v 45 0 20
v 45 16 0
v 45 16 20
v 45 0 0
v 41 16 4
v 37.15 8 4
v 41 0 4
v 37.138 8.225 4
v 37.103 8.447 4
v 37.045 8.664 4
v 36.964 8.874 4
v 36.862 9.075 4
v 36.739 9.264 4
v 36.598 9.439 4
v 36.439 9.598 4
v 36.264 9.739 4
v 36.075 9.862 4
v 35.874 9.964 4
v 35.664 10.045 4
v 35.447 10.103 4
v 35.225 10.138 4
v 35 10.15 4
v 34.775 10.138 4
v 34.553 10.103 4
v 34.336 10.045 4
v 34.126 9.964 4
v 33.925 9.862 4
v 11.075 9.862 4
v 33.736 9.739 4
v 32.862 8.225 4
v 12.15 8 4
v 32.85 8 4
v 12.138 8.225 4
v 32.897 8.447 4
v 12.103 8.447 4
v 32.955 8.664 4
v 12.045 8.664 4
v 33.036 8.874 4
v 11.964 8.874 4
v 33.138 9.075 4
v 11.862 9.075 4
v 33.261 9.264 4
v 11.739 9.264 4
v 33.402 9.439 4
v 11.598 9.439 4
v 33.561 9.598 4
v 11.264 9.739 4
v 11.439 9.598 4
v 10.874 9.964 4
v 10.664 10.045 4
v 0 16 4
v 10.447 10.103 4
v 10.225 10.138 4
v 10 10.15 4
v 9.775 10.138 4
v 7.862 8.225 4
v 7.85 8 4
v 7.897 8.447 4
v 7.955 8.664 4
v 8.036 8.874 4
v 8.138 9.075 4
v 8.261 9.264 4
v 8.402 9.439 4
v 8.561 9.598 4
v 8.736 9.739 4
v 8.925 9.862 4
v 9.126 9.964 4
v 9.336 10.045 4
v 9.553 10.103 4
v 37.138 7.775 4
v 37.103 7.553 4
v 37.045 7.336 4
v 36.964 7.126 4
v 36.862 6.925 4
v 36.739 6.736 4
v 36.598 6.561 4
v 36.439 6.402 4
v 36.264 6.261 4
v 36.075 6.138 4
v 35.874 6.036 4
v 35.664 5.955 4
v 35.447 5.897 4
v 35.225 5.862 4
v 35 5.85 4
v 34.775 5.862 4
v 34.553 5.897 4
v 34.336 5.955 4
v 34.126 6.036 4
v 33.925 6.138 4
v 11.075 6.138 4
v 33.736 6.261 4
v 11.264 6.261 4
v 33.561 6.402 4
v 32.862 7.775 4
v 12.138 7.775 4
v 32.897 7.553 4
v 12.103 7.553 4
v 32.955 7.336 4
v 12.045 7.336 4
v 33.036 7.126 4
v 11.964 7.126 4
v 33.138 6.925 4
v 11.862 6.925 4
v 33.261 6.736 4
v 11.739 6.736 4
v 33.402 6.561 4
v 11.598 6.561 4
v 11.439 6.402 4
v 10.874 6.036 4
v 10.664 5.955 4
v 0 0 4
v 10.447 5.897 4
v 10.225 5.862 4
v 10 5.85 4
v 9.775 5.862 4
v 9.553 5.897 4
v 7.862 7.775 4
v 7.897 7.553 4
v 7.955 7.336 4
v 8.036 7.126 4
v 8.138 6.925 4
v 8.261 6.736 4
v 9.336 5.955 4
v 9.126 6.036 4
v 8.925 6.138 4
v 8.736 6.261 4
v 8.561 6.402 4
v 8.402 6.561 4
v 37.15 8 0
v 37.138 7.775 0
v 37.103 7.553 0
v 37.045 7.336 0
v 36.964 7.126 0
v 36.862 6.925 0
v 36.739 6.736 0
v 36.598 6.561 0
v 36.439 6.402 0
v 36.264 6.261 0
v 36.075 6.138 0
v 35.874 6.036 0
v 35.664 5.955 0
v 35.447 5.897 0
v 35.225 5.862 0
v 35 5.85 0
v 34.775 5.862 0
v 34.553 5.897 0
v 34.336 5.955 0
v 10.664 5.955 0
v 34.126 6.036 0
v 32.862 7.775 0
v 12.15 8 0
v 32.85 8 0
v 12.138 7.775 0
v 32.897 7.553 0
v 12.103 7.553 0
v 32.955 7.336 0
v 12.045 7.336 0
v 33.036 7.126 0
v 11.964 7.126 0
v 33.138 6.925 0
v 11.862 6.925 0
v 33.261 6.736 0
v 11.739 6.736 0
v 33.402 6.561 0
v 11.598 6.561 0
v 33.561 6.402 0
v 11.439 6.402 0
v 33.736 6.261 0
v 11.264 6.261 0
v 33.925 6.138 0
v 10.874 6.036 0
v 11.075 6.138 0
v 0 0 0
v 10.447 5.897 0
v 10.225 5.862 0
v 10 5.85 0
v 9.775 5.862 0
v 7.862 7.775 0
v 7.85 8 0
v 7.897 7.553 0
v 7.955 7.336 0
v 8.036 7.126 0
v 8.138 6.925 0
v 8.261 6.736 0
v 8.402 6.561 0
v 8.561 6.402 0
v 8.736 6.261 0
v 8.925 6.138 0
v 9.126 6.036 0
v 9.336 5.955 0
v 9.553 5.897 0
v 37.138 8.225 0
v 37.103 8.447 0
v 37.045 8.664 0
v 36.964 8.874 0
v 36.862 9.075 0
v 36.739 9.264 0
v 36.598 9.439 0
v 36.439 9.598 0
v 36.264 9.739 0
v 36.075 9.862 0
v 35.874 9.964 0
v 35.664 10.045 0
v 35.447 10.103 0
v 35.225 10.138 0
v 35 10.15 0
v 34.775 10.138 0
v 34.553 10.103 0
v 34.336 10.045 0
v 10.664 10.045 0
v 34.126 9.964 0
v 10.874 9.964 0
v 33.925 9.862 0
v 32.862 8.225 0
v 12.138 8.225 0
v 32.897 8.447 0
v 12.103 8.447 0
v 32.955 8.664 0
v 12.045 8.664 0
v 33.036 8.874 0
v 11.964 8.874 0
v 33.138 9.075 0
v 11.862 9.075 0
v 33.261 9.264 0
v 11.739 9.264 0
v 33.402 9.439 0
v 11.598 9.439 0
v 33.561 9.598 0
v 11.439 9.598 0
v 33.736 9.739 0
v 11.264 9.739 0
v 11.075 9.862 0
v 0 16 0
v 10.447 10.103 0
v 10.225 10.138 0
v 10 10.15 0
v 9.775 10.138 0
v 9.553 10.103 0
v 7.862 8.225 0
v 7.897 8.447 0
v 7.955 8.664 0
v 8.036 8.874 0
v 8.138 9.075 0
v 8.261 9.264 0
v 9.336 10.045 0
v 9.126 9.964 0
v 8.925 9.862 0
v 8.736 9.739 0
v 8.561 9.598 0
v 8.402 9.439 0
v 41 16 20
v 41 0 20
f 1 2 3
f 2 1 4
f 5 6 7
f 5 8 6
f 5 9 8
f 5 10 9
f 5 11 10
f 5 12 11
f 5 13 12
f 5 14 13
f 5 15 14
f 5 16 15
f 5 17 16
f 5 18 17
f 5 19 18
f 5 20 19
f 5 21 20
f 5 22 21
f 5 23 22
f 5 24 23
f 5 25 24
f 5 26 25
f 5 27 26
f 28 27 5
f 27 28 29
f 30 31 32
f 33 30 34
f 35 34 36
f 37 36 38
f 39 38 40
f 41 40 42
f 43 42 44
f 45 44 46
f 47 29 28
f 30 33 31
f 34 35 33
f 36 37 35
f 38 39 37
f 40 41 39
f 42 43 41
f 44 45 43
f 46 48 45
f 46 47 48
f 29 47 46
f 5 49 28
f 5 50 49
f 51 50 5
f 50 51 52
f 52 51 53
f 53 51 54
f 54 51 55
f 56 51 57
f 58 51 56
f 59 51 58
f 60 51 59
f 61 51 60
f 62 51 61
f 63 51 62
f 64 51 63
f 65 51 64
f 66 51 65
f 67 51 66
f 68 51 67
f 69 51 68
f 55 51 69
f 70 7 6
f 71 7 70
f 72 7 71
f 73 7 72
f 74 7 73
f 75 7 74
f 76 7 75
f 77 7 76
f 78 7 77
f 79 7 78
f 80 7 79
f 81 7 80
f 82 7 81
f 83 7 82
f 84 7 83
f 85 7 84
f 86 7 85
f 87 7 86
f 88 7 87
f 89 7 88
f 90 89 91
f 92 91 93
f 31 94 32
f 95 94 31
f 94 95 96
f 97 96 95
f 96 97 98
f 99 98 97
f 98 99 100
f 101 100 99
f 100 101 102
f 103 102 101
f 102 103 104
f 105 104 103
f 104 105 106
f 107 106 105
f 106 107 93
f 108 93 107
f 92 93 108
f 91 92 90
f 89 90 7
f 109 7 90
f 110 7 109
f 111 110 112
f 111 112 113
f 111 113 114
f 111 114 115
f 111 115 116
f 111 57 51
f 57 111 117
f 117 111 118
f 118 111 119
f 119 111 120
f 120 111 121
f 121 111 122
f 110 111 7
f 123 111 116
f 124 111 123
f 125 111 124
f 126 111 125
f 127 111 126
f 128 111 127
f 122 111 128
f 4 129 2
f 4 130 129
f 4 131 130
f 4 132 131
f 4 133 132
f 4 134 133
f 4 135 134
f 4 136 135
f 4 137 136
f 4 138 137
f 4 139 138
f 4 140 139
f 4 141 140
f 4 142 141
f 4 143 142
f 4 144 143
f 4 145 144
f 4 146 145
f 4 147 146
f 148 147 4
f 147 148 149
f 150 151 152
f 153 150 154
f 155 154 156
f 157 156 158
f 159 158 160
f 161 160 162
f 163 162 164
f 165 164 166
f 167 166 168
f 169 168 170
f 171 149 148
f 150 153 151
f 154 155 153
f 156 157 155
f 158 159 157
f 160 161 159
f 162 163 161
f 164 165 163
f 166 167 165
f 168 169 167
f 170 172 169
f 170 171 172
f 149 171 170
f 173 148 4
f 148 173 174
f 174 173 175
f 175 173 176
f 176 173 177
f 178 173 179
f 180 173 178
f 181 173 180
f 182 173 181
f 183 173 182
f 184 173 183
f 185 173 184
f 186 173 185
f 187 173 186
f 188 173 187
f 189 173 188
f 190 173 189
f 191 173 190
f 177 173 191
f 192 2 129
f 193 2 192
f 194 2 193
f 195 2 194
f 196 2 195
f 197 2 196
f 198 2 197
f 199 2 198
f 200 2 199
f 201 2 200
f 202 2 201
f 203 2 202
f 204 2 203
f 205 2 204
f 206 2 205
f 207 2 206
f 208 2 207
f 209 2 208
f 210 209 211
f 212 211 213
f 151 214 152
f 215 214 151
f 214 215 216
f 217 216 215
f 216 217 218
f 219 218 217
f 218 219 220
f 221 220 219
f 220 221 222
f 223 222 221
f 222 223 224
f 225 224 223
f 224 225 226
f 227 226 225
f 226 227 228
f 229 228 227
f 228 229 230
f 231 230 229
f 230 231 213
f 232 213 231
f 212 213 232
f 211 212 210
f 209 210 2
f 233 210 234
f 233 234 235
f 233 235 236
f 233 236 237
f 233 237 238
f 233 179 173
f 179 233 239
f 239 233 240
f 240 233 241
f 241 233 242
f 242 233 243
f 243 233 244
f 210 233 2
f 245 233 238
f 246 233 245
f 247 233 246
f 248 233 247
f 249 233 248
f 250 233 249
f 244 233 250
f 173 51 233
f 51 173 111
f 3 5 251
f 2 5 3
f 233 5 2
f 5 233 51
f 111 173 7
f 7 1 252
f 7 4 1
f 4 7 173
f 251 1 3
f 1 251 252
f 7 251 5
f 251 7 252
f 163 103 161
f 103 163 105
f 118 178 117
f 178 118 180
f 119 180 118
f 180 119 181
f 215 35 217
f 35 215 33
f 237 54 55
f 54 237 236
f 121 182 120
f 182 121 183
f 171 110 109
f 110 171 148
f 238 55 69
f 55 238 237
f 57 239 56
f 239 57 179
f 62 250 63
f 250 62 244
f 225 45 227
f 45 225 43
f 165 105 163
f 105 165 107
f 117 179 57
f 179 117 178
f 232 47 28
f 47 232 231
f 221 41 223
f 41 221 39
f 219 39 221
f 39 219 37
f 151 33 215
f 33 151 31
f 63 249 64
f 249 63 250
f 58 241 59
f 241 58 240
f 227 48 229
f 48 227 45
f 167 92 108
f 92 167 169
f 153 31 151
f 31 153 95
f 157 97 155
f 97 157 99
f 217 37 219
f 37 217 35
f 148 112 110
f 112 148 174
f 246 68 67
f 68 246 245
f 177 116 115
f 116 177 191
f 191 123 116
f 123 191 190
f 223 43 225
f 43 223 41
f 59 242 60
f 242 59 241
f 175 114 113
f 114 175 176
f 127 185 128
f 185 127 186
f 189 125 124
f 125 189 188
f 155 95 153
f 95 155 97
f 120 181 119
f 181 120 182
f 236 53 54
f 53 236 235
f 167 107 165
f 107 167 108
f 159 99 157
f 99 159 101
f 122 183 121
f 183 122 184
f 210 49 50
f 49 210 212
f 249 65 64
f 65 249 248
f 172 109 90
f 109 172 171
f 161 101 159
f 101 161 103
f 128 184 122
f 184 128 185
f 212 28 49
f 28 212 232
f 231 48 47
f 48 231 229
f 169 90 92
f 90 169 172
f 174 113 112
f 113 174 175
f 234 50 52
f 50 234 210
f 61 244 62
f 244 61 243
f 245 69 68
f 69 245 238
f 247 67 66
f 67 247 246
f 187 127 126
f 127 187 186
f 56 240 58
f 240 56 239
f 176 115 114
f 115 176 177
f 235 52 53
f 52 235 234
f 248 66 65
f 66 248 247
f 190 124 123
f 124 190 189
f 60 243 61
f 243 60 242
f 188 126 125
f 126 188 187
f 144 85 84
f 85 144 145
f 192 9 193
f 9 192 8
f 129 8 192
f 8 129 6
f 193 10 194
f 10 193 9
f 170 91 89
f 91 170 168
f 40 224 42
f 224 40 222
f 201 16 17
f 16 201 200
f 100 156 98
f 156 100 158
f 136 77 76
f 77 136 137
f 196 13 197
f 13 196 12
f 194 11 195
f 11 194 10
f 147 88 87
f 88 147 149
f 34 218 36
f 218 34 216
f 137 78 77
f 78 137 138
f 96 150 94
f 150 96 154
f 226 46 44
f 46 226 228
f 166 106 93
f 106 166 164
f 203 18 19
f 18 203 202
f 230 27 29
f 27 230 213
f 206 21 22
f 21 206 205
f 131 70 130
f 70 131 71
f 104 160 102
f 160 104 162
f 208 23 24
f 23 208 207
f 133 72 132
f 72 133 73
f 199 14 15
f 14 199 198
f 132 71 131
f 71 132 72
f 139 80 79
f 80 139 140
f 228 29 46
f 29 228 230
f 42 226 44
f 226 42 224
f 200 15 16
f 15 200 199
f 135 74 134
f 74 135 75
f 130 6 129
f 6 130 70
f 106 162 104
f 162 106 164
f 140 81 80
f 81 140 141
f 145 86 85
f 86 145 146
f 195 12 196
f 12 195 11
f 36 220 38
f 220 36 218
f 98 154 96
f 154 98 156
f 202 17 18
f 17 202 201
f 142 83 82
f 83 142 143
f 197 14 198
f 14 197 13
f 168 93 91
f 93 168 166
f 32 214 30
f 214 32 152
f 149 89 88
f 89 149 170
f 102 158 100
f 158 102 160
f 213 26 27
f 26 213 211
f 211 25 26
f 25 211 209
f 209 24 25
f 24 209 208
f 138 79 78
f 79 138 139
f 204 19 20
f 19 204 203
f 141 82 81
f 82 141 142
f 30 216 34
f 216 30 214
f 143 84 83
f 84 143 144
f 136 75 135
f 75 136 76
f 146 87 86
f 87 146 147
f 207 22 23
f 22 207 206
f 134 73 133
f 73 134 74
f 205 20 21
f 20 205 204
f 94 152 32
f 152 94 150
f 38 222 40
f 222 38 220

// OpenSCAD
// Latch hook bracket.
$fn = 60;
eps = 0.02;
length = 45;
height = 16;
width = 16;
thickness = 4;
difference() { union() { cube([length,width,thickness]); translate([length-thickness,0,thickness]) cube([thickness,width,height]); } for(x=[10,length-10]) translate([x,width/2,-eps]) cylinder(d=4.3,h=thickness+2*eps); }
